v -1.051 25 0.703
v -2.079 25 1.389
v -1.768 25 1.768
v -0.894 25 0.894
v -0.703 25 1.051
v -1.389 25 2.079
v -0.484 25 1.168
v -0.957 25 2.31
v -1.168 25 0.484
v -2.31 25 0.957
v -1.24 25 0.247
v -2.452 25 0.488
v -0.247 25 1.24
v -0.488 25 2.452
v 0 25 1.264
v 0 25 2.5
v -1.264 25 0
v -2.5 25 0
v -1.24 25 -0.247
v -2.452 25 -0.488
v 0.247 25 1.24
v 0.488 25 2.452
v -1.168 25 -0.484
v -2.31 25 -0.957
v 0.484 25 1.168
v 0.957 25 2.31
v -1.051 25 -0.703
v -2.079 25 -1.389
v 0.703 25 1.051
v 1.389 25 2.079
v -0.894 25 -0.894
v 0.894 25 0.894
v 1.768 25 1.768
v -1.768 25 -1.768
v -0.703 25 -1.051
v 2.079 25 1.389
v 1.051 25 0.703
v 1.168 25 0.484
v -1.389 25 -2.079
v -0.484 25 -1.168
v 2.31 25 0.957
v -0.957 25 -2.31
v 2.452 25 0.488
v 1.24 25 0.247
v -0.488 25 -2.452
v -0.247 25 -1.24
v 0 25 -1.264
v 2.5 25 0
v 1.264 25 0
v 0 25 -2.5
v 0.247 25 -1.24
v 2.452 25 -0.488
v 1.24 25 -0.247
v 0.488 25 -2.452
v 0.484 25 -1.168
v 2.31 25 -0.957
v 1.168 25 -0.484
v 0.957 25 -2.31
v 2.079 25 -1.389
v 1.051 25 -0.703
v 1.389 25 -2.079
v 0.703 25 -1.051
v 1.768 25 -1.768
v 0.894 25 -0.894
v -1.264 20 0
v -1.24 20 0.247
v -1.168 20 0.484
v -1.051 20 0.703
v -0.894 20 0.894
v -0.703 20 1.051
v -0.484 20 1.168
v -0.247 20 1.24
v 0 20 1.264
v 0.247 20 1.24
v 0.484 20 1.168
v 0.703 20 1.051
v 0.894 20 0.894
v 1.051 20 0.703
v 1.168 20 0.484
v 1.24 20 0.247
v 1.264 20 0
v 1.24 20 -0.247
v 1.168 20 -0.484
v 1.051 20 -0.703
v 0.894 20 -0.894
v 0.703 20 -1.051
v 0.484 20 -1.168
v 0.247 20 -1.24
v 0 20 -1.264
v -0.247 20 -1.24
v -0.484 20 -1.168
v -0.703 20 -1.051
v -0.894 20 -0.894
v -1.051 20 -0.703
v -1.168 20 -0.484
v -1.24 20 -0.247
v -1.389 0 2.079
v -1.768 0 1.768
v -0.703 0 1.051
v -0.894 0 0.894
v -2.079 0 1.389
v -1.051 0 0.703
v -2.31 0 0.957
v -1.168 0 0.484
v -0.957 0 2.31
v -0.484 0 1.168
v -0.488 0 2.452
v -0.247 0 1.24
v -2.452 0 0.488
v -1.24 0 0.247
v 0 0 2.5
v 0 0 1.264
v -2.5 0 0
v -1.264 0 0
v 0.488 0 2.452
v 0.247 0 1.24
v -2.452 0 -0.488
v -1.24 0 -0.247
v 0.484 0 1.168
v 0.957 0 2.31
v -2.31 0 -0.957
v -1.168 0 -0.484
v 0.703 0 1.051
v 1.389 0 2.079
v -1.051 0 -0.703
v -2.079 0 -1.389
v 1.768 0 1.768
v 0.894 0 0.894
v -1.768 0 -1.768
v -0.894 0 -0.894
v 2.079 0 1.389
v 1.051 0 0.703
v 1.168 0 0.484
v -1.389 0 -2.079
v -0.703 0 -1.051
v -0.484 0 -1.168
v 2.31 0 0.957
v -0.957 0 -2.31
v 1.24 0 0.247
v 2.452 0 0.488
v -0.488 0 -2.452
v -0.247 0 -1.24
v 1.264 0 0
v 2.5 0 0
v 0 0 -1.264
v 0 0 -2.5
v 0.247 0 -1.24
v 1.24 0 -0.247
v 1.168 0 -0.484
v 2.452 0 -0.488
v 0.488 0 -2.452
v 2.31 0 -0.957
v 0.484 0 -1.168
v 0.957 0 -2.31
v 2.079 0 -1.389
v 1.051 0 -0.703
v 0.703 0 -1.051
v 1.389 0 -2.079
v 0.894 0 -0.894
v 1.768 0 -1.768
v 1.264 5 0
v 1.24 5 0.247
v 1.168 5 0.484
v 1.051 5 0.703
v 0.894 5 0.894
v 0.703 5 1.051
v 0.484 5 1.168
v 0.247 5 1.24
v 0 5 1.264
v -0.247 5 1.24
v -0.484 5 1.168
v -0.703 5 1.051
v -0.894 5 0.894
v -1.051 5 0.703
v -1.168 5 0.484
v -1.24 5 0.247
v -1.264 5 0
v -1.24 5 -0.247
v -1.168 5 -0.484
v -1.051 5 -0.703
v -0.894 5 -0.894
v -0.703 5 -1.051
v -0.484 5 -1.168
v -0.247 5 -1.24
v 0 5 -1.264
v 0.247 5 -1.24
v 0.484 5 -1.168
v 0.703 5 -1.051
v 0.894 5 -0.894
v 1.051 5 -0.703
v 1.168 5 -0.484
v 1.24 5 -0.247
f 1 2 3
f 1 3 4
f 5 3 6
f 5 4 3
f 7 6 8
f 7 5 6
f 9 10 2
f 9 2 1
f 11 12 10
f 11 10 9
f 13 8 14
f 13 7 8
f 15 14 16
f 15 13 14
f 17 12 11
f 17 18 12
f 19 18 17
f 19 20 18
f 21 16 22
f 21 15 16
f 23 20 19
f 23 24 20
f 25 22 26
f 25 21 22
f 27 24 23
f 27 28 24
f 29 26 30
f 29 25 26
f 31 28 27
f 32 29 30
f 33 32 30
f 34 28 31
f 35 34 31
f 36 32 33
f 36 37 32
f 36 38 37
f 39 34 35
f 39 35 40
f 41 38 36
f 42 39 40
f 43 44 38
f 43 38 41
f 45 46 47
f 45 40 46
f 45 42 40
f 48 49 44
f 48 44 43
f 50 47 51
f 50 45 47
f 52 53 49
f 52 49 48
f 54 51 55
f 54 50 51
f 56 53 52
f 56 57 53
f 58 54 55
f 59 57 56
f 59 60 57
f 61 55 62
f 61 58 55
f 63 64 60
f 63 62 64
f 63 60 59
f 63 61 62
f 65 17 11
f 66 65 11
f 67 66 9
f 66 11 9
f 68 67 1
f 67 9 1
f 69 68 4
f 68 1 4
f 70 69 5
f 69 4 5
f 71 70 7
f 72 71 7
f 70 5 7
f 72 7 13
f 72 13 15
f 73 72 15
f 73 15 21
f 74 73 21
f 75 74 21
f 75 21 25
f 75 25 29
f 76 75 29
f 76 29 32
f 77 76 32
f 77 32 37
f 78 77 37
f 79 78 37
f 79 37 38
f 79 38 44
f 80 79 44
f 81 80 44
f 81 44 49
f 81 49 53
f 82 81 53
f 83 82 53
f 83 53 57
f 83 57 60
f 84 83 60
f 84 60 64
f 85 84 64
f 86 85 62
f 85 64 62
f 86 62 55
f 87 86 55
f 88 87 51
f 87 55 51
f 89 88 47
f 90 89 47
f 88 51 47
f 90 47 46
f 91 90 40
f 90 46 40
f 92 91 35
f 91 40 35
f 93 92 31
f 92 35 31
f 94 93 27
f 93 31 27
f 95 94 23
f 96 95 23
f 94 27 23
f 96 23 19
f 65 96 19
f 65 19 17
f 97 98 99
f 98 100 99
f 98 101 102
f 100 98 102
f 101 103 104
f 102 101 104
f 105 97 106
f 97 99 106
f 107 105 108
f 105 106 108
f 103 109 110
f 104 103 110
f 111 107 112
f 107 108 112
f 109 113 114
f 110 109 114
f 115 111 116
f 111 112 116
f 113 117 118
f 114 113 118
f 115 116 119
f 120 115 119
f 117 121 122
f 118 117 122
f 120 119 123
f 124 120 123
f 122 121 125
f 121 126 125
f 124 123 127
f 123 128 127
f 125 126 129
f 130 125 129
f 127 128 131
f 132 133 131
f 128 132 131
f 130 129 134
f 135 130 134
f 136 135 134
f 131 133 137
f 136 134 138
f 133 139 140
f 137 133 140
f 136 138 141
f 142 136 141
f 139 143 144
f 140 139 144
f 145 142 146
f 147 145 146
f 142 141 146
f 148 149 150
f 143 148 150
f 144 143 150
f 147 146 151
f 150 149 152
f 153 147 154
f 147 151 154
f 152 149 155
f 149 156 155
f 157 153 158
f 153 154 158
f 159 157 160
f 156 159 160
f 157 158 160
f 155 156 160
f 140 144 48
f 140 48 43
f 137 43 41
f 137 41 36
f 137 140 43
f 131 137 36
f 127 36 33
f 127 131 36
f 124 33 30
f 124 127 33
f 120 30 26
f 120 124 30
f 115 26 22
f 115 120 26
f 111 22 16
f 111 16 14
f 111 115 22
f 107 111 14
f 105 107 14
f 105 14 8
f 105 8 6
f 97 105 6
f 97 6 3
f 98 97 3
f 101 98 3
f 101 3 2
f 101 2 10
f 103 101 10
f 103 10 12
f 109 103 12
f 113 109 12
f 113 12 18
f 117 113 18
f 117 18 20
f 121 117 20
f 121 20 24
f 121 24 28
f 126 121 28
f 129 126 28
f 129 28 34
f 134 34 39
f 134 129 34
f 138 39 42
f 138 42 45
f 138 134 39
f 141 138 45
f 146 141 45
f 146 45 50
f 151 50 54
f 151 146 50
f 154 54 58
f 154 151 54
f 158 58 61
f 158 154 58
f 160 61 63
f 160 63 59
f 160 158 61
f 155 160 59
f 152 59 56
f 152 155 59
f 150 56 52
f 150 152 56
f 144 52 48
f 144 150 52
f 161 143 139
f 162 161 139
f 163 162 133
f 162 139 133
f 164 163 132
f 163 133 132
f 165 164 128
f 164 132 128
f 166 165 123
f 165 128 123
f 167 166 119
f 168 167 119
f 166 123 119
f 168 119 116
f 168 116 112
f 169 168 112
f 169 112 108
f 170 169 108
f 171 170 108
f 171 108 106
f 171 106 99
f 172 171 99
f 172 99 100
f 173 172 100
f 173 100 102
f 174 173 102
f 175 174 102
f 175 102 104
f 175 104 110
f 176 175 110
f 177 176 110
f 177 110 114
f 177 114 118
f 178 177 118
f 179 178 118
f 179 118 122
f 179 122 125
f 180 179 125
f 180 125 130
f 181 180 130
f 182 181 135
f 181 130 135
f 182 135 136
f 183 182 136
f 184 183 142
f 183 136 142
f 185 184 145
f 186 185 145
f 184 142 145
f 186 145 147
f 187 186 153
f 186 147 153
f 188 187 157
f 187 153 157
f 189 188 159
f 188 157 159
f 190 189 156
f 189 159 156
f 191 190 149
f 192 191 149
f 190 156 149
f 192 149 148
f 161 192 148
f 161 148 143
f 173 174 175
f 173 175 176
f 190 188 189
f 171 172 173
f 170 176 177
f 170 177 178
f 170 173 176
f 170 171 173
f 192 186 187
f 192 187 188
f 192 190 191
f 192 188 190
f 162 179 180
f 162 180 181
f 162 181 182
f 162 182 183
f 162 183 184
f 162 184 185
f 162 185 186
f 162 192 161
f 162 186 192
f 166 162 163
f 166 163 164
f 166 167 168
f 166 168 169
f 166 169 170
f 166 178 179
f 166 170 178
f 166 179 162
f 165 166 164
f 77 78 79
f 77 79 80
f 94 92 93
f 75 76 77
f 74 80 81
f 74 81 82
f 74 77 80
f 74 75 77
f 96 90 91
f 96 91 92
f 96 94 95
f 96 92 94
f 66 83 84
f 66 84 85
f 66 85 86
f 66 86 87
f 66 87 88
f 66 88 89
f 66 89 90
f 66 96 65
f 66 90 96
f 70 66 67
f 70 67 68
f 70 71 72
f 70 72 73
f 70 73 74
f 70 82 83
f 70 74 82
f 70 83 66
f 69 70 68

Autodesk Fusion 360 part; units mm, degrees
sketch "Sketch1" plane through (0, 0, 0) normal (0, 1, 0) x (1, 0, 0)
  circle A0 centre (0, 0) radius 2.5
  dimension "d1" = 5
extrude "Extrude1" add sketch "Sketch1" along normal blind 25
sketch "Sketch2" plane through (0, 25, 0) normal (0, 1, 0) x (-1, 0, 0)
  circle A0 centre (0, 0) radius 1.5
  dimension "d4" = 3
extrude "Extrude2" cut sketch "Sketch2" against normal blind 5
sketch "Sketch3" plane through (0, 0, 0) normal (0, -1, 0) x (1, 0, 0)
  circle A0 centre (0, 0) radius 1.5
  dimension "d7" = 3
extrude "Extrude3" cut sketch "Sketch3" against normal blind 5
thread "Thread1" "ISO Metric profile 3.0 M3x0.5 6H" major diameter 3.086 minor diameter 2.529 pitch 0.5 angle 60 resizes the face on face at (1.4981, 3.3333, -0.0748)
thread "Thread2" "ISO Metric profile 3.0 M3x0.5 6H" major diameter 3.086 minor diameter 2.529 pitch 0.5 angle 60 resizes the face on face at (-1.4981, 21.6667, -0.0748)
